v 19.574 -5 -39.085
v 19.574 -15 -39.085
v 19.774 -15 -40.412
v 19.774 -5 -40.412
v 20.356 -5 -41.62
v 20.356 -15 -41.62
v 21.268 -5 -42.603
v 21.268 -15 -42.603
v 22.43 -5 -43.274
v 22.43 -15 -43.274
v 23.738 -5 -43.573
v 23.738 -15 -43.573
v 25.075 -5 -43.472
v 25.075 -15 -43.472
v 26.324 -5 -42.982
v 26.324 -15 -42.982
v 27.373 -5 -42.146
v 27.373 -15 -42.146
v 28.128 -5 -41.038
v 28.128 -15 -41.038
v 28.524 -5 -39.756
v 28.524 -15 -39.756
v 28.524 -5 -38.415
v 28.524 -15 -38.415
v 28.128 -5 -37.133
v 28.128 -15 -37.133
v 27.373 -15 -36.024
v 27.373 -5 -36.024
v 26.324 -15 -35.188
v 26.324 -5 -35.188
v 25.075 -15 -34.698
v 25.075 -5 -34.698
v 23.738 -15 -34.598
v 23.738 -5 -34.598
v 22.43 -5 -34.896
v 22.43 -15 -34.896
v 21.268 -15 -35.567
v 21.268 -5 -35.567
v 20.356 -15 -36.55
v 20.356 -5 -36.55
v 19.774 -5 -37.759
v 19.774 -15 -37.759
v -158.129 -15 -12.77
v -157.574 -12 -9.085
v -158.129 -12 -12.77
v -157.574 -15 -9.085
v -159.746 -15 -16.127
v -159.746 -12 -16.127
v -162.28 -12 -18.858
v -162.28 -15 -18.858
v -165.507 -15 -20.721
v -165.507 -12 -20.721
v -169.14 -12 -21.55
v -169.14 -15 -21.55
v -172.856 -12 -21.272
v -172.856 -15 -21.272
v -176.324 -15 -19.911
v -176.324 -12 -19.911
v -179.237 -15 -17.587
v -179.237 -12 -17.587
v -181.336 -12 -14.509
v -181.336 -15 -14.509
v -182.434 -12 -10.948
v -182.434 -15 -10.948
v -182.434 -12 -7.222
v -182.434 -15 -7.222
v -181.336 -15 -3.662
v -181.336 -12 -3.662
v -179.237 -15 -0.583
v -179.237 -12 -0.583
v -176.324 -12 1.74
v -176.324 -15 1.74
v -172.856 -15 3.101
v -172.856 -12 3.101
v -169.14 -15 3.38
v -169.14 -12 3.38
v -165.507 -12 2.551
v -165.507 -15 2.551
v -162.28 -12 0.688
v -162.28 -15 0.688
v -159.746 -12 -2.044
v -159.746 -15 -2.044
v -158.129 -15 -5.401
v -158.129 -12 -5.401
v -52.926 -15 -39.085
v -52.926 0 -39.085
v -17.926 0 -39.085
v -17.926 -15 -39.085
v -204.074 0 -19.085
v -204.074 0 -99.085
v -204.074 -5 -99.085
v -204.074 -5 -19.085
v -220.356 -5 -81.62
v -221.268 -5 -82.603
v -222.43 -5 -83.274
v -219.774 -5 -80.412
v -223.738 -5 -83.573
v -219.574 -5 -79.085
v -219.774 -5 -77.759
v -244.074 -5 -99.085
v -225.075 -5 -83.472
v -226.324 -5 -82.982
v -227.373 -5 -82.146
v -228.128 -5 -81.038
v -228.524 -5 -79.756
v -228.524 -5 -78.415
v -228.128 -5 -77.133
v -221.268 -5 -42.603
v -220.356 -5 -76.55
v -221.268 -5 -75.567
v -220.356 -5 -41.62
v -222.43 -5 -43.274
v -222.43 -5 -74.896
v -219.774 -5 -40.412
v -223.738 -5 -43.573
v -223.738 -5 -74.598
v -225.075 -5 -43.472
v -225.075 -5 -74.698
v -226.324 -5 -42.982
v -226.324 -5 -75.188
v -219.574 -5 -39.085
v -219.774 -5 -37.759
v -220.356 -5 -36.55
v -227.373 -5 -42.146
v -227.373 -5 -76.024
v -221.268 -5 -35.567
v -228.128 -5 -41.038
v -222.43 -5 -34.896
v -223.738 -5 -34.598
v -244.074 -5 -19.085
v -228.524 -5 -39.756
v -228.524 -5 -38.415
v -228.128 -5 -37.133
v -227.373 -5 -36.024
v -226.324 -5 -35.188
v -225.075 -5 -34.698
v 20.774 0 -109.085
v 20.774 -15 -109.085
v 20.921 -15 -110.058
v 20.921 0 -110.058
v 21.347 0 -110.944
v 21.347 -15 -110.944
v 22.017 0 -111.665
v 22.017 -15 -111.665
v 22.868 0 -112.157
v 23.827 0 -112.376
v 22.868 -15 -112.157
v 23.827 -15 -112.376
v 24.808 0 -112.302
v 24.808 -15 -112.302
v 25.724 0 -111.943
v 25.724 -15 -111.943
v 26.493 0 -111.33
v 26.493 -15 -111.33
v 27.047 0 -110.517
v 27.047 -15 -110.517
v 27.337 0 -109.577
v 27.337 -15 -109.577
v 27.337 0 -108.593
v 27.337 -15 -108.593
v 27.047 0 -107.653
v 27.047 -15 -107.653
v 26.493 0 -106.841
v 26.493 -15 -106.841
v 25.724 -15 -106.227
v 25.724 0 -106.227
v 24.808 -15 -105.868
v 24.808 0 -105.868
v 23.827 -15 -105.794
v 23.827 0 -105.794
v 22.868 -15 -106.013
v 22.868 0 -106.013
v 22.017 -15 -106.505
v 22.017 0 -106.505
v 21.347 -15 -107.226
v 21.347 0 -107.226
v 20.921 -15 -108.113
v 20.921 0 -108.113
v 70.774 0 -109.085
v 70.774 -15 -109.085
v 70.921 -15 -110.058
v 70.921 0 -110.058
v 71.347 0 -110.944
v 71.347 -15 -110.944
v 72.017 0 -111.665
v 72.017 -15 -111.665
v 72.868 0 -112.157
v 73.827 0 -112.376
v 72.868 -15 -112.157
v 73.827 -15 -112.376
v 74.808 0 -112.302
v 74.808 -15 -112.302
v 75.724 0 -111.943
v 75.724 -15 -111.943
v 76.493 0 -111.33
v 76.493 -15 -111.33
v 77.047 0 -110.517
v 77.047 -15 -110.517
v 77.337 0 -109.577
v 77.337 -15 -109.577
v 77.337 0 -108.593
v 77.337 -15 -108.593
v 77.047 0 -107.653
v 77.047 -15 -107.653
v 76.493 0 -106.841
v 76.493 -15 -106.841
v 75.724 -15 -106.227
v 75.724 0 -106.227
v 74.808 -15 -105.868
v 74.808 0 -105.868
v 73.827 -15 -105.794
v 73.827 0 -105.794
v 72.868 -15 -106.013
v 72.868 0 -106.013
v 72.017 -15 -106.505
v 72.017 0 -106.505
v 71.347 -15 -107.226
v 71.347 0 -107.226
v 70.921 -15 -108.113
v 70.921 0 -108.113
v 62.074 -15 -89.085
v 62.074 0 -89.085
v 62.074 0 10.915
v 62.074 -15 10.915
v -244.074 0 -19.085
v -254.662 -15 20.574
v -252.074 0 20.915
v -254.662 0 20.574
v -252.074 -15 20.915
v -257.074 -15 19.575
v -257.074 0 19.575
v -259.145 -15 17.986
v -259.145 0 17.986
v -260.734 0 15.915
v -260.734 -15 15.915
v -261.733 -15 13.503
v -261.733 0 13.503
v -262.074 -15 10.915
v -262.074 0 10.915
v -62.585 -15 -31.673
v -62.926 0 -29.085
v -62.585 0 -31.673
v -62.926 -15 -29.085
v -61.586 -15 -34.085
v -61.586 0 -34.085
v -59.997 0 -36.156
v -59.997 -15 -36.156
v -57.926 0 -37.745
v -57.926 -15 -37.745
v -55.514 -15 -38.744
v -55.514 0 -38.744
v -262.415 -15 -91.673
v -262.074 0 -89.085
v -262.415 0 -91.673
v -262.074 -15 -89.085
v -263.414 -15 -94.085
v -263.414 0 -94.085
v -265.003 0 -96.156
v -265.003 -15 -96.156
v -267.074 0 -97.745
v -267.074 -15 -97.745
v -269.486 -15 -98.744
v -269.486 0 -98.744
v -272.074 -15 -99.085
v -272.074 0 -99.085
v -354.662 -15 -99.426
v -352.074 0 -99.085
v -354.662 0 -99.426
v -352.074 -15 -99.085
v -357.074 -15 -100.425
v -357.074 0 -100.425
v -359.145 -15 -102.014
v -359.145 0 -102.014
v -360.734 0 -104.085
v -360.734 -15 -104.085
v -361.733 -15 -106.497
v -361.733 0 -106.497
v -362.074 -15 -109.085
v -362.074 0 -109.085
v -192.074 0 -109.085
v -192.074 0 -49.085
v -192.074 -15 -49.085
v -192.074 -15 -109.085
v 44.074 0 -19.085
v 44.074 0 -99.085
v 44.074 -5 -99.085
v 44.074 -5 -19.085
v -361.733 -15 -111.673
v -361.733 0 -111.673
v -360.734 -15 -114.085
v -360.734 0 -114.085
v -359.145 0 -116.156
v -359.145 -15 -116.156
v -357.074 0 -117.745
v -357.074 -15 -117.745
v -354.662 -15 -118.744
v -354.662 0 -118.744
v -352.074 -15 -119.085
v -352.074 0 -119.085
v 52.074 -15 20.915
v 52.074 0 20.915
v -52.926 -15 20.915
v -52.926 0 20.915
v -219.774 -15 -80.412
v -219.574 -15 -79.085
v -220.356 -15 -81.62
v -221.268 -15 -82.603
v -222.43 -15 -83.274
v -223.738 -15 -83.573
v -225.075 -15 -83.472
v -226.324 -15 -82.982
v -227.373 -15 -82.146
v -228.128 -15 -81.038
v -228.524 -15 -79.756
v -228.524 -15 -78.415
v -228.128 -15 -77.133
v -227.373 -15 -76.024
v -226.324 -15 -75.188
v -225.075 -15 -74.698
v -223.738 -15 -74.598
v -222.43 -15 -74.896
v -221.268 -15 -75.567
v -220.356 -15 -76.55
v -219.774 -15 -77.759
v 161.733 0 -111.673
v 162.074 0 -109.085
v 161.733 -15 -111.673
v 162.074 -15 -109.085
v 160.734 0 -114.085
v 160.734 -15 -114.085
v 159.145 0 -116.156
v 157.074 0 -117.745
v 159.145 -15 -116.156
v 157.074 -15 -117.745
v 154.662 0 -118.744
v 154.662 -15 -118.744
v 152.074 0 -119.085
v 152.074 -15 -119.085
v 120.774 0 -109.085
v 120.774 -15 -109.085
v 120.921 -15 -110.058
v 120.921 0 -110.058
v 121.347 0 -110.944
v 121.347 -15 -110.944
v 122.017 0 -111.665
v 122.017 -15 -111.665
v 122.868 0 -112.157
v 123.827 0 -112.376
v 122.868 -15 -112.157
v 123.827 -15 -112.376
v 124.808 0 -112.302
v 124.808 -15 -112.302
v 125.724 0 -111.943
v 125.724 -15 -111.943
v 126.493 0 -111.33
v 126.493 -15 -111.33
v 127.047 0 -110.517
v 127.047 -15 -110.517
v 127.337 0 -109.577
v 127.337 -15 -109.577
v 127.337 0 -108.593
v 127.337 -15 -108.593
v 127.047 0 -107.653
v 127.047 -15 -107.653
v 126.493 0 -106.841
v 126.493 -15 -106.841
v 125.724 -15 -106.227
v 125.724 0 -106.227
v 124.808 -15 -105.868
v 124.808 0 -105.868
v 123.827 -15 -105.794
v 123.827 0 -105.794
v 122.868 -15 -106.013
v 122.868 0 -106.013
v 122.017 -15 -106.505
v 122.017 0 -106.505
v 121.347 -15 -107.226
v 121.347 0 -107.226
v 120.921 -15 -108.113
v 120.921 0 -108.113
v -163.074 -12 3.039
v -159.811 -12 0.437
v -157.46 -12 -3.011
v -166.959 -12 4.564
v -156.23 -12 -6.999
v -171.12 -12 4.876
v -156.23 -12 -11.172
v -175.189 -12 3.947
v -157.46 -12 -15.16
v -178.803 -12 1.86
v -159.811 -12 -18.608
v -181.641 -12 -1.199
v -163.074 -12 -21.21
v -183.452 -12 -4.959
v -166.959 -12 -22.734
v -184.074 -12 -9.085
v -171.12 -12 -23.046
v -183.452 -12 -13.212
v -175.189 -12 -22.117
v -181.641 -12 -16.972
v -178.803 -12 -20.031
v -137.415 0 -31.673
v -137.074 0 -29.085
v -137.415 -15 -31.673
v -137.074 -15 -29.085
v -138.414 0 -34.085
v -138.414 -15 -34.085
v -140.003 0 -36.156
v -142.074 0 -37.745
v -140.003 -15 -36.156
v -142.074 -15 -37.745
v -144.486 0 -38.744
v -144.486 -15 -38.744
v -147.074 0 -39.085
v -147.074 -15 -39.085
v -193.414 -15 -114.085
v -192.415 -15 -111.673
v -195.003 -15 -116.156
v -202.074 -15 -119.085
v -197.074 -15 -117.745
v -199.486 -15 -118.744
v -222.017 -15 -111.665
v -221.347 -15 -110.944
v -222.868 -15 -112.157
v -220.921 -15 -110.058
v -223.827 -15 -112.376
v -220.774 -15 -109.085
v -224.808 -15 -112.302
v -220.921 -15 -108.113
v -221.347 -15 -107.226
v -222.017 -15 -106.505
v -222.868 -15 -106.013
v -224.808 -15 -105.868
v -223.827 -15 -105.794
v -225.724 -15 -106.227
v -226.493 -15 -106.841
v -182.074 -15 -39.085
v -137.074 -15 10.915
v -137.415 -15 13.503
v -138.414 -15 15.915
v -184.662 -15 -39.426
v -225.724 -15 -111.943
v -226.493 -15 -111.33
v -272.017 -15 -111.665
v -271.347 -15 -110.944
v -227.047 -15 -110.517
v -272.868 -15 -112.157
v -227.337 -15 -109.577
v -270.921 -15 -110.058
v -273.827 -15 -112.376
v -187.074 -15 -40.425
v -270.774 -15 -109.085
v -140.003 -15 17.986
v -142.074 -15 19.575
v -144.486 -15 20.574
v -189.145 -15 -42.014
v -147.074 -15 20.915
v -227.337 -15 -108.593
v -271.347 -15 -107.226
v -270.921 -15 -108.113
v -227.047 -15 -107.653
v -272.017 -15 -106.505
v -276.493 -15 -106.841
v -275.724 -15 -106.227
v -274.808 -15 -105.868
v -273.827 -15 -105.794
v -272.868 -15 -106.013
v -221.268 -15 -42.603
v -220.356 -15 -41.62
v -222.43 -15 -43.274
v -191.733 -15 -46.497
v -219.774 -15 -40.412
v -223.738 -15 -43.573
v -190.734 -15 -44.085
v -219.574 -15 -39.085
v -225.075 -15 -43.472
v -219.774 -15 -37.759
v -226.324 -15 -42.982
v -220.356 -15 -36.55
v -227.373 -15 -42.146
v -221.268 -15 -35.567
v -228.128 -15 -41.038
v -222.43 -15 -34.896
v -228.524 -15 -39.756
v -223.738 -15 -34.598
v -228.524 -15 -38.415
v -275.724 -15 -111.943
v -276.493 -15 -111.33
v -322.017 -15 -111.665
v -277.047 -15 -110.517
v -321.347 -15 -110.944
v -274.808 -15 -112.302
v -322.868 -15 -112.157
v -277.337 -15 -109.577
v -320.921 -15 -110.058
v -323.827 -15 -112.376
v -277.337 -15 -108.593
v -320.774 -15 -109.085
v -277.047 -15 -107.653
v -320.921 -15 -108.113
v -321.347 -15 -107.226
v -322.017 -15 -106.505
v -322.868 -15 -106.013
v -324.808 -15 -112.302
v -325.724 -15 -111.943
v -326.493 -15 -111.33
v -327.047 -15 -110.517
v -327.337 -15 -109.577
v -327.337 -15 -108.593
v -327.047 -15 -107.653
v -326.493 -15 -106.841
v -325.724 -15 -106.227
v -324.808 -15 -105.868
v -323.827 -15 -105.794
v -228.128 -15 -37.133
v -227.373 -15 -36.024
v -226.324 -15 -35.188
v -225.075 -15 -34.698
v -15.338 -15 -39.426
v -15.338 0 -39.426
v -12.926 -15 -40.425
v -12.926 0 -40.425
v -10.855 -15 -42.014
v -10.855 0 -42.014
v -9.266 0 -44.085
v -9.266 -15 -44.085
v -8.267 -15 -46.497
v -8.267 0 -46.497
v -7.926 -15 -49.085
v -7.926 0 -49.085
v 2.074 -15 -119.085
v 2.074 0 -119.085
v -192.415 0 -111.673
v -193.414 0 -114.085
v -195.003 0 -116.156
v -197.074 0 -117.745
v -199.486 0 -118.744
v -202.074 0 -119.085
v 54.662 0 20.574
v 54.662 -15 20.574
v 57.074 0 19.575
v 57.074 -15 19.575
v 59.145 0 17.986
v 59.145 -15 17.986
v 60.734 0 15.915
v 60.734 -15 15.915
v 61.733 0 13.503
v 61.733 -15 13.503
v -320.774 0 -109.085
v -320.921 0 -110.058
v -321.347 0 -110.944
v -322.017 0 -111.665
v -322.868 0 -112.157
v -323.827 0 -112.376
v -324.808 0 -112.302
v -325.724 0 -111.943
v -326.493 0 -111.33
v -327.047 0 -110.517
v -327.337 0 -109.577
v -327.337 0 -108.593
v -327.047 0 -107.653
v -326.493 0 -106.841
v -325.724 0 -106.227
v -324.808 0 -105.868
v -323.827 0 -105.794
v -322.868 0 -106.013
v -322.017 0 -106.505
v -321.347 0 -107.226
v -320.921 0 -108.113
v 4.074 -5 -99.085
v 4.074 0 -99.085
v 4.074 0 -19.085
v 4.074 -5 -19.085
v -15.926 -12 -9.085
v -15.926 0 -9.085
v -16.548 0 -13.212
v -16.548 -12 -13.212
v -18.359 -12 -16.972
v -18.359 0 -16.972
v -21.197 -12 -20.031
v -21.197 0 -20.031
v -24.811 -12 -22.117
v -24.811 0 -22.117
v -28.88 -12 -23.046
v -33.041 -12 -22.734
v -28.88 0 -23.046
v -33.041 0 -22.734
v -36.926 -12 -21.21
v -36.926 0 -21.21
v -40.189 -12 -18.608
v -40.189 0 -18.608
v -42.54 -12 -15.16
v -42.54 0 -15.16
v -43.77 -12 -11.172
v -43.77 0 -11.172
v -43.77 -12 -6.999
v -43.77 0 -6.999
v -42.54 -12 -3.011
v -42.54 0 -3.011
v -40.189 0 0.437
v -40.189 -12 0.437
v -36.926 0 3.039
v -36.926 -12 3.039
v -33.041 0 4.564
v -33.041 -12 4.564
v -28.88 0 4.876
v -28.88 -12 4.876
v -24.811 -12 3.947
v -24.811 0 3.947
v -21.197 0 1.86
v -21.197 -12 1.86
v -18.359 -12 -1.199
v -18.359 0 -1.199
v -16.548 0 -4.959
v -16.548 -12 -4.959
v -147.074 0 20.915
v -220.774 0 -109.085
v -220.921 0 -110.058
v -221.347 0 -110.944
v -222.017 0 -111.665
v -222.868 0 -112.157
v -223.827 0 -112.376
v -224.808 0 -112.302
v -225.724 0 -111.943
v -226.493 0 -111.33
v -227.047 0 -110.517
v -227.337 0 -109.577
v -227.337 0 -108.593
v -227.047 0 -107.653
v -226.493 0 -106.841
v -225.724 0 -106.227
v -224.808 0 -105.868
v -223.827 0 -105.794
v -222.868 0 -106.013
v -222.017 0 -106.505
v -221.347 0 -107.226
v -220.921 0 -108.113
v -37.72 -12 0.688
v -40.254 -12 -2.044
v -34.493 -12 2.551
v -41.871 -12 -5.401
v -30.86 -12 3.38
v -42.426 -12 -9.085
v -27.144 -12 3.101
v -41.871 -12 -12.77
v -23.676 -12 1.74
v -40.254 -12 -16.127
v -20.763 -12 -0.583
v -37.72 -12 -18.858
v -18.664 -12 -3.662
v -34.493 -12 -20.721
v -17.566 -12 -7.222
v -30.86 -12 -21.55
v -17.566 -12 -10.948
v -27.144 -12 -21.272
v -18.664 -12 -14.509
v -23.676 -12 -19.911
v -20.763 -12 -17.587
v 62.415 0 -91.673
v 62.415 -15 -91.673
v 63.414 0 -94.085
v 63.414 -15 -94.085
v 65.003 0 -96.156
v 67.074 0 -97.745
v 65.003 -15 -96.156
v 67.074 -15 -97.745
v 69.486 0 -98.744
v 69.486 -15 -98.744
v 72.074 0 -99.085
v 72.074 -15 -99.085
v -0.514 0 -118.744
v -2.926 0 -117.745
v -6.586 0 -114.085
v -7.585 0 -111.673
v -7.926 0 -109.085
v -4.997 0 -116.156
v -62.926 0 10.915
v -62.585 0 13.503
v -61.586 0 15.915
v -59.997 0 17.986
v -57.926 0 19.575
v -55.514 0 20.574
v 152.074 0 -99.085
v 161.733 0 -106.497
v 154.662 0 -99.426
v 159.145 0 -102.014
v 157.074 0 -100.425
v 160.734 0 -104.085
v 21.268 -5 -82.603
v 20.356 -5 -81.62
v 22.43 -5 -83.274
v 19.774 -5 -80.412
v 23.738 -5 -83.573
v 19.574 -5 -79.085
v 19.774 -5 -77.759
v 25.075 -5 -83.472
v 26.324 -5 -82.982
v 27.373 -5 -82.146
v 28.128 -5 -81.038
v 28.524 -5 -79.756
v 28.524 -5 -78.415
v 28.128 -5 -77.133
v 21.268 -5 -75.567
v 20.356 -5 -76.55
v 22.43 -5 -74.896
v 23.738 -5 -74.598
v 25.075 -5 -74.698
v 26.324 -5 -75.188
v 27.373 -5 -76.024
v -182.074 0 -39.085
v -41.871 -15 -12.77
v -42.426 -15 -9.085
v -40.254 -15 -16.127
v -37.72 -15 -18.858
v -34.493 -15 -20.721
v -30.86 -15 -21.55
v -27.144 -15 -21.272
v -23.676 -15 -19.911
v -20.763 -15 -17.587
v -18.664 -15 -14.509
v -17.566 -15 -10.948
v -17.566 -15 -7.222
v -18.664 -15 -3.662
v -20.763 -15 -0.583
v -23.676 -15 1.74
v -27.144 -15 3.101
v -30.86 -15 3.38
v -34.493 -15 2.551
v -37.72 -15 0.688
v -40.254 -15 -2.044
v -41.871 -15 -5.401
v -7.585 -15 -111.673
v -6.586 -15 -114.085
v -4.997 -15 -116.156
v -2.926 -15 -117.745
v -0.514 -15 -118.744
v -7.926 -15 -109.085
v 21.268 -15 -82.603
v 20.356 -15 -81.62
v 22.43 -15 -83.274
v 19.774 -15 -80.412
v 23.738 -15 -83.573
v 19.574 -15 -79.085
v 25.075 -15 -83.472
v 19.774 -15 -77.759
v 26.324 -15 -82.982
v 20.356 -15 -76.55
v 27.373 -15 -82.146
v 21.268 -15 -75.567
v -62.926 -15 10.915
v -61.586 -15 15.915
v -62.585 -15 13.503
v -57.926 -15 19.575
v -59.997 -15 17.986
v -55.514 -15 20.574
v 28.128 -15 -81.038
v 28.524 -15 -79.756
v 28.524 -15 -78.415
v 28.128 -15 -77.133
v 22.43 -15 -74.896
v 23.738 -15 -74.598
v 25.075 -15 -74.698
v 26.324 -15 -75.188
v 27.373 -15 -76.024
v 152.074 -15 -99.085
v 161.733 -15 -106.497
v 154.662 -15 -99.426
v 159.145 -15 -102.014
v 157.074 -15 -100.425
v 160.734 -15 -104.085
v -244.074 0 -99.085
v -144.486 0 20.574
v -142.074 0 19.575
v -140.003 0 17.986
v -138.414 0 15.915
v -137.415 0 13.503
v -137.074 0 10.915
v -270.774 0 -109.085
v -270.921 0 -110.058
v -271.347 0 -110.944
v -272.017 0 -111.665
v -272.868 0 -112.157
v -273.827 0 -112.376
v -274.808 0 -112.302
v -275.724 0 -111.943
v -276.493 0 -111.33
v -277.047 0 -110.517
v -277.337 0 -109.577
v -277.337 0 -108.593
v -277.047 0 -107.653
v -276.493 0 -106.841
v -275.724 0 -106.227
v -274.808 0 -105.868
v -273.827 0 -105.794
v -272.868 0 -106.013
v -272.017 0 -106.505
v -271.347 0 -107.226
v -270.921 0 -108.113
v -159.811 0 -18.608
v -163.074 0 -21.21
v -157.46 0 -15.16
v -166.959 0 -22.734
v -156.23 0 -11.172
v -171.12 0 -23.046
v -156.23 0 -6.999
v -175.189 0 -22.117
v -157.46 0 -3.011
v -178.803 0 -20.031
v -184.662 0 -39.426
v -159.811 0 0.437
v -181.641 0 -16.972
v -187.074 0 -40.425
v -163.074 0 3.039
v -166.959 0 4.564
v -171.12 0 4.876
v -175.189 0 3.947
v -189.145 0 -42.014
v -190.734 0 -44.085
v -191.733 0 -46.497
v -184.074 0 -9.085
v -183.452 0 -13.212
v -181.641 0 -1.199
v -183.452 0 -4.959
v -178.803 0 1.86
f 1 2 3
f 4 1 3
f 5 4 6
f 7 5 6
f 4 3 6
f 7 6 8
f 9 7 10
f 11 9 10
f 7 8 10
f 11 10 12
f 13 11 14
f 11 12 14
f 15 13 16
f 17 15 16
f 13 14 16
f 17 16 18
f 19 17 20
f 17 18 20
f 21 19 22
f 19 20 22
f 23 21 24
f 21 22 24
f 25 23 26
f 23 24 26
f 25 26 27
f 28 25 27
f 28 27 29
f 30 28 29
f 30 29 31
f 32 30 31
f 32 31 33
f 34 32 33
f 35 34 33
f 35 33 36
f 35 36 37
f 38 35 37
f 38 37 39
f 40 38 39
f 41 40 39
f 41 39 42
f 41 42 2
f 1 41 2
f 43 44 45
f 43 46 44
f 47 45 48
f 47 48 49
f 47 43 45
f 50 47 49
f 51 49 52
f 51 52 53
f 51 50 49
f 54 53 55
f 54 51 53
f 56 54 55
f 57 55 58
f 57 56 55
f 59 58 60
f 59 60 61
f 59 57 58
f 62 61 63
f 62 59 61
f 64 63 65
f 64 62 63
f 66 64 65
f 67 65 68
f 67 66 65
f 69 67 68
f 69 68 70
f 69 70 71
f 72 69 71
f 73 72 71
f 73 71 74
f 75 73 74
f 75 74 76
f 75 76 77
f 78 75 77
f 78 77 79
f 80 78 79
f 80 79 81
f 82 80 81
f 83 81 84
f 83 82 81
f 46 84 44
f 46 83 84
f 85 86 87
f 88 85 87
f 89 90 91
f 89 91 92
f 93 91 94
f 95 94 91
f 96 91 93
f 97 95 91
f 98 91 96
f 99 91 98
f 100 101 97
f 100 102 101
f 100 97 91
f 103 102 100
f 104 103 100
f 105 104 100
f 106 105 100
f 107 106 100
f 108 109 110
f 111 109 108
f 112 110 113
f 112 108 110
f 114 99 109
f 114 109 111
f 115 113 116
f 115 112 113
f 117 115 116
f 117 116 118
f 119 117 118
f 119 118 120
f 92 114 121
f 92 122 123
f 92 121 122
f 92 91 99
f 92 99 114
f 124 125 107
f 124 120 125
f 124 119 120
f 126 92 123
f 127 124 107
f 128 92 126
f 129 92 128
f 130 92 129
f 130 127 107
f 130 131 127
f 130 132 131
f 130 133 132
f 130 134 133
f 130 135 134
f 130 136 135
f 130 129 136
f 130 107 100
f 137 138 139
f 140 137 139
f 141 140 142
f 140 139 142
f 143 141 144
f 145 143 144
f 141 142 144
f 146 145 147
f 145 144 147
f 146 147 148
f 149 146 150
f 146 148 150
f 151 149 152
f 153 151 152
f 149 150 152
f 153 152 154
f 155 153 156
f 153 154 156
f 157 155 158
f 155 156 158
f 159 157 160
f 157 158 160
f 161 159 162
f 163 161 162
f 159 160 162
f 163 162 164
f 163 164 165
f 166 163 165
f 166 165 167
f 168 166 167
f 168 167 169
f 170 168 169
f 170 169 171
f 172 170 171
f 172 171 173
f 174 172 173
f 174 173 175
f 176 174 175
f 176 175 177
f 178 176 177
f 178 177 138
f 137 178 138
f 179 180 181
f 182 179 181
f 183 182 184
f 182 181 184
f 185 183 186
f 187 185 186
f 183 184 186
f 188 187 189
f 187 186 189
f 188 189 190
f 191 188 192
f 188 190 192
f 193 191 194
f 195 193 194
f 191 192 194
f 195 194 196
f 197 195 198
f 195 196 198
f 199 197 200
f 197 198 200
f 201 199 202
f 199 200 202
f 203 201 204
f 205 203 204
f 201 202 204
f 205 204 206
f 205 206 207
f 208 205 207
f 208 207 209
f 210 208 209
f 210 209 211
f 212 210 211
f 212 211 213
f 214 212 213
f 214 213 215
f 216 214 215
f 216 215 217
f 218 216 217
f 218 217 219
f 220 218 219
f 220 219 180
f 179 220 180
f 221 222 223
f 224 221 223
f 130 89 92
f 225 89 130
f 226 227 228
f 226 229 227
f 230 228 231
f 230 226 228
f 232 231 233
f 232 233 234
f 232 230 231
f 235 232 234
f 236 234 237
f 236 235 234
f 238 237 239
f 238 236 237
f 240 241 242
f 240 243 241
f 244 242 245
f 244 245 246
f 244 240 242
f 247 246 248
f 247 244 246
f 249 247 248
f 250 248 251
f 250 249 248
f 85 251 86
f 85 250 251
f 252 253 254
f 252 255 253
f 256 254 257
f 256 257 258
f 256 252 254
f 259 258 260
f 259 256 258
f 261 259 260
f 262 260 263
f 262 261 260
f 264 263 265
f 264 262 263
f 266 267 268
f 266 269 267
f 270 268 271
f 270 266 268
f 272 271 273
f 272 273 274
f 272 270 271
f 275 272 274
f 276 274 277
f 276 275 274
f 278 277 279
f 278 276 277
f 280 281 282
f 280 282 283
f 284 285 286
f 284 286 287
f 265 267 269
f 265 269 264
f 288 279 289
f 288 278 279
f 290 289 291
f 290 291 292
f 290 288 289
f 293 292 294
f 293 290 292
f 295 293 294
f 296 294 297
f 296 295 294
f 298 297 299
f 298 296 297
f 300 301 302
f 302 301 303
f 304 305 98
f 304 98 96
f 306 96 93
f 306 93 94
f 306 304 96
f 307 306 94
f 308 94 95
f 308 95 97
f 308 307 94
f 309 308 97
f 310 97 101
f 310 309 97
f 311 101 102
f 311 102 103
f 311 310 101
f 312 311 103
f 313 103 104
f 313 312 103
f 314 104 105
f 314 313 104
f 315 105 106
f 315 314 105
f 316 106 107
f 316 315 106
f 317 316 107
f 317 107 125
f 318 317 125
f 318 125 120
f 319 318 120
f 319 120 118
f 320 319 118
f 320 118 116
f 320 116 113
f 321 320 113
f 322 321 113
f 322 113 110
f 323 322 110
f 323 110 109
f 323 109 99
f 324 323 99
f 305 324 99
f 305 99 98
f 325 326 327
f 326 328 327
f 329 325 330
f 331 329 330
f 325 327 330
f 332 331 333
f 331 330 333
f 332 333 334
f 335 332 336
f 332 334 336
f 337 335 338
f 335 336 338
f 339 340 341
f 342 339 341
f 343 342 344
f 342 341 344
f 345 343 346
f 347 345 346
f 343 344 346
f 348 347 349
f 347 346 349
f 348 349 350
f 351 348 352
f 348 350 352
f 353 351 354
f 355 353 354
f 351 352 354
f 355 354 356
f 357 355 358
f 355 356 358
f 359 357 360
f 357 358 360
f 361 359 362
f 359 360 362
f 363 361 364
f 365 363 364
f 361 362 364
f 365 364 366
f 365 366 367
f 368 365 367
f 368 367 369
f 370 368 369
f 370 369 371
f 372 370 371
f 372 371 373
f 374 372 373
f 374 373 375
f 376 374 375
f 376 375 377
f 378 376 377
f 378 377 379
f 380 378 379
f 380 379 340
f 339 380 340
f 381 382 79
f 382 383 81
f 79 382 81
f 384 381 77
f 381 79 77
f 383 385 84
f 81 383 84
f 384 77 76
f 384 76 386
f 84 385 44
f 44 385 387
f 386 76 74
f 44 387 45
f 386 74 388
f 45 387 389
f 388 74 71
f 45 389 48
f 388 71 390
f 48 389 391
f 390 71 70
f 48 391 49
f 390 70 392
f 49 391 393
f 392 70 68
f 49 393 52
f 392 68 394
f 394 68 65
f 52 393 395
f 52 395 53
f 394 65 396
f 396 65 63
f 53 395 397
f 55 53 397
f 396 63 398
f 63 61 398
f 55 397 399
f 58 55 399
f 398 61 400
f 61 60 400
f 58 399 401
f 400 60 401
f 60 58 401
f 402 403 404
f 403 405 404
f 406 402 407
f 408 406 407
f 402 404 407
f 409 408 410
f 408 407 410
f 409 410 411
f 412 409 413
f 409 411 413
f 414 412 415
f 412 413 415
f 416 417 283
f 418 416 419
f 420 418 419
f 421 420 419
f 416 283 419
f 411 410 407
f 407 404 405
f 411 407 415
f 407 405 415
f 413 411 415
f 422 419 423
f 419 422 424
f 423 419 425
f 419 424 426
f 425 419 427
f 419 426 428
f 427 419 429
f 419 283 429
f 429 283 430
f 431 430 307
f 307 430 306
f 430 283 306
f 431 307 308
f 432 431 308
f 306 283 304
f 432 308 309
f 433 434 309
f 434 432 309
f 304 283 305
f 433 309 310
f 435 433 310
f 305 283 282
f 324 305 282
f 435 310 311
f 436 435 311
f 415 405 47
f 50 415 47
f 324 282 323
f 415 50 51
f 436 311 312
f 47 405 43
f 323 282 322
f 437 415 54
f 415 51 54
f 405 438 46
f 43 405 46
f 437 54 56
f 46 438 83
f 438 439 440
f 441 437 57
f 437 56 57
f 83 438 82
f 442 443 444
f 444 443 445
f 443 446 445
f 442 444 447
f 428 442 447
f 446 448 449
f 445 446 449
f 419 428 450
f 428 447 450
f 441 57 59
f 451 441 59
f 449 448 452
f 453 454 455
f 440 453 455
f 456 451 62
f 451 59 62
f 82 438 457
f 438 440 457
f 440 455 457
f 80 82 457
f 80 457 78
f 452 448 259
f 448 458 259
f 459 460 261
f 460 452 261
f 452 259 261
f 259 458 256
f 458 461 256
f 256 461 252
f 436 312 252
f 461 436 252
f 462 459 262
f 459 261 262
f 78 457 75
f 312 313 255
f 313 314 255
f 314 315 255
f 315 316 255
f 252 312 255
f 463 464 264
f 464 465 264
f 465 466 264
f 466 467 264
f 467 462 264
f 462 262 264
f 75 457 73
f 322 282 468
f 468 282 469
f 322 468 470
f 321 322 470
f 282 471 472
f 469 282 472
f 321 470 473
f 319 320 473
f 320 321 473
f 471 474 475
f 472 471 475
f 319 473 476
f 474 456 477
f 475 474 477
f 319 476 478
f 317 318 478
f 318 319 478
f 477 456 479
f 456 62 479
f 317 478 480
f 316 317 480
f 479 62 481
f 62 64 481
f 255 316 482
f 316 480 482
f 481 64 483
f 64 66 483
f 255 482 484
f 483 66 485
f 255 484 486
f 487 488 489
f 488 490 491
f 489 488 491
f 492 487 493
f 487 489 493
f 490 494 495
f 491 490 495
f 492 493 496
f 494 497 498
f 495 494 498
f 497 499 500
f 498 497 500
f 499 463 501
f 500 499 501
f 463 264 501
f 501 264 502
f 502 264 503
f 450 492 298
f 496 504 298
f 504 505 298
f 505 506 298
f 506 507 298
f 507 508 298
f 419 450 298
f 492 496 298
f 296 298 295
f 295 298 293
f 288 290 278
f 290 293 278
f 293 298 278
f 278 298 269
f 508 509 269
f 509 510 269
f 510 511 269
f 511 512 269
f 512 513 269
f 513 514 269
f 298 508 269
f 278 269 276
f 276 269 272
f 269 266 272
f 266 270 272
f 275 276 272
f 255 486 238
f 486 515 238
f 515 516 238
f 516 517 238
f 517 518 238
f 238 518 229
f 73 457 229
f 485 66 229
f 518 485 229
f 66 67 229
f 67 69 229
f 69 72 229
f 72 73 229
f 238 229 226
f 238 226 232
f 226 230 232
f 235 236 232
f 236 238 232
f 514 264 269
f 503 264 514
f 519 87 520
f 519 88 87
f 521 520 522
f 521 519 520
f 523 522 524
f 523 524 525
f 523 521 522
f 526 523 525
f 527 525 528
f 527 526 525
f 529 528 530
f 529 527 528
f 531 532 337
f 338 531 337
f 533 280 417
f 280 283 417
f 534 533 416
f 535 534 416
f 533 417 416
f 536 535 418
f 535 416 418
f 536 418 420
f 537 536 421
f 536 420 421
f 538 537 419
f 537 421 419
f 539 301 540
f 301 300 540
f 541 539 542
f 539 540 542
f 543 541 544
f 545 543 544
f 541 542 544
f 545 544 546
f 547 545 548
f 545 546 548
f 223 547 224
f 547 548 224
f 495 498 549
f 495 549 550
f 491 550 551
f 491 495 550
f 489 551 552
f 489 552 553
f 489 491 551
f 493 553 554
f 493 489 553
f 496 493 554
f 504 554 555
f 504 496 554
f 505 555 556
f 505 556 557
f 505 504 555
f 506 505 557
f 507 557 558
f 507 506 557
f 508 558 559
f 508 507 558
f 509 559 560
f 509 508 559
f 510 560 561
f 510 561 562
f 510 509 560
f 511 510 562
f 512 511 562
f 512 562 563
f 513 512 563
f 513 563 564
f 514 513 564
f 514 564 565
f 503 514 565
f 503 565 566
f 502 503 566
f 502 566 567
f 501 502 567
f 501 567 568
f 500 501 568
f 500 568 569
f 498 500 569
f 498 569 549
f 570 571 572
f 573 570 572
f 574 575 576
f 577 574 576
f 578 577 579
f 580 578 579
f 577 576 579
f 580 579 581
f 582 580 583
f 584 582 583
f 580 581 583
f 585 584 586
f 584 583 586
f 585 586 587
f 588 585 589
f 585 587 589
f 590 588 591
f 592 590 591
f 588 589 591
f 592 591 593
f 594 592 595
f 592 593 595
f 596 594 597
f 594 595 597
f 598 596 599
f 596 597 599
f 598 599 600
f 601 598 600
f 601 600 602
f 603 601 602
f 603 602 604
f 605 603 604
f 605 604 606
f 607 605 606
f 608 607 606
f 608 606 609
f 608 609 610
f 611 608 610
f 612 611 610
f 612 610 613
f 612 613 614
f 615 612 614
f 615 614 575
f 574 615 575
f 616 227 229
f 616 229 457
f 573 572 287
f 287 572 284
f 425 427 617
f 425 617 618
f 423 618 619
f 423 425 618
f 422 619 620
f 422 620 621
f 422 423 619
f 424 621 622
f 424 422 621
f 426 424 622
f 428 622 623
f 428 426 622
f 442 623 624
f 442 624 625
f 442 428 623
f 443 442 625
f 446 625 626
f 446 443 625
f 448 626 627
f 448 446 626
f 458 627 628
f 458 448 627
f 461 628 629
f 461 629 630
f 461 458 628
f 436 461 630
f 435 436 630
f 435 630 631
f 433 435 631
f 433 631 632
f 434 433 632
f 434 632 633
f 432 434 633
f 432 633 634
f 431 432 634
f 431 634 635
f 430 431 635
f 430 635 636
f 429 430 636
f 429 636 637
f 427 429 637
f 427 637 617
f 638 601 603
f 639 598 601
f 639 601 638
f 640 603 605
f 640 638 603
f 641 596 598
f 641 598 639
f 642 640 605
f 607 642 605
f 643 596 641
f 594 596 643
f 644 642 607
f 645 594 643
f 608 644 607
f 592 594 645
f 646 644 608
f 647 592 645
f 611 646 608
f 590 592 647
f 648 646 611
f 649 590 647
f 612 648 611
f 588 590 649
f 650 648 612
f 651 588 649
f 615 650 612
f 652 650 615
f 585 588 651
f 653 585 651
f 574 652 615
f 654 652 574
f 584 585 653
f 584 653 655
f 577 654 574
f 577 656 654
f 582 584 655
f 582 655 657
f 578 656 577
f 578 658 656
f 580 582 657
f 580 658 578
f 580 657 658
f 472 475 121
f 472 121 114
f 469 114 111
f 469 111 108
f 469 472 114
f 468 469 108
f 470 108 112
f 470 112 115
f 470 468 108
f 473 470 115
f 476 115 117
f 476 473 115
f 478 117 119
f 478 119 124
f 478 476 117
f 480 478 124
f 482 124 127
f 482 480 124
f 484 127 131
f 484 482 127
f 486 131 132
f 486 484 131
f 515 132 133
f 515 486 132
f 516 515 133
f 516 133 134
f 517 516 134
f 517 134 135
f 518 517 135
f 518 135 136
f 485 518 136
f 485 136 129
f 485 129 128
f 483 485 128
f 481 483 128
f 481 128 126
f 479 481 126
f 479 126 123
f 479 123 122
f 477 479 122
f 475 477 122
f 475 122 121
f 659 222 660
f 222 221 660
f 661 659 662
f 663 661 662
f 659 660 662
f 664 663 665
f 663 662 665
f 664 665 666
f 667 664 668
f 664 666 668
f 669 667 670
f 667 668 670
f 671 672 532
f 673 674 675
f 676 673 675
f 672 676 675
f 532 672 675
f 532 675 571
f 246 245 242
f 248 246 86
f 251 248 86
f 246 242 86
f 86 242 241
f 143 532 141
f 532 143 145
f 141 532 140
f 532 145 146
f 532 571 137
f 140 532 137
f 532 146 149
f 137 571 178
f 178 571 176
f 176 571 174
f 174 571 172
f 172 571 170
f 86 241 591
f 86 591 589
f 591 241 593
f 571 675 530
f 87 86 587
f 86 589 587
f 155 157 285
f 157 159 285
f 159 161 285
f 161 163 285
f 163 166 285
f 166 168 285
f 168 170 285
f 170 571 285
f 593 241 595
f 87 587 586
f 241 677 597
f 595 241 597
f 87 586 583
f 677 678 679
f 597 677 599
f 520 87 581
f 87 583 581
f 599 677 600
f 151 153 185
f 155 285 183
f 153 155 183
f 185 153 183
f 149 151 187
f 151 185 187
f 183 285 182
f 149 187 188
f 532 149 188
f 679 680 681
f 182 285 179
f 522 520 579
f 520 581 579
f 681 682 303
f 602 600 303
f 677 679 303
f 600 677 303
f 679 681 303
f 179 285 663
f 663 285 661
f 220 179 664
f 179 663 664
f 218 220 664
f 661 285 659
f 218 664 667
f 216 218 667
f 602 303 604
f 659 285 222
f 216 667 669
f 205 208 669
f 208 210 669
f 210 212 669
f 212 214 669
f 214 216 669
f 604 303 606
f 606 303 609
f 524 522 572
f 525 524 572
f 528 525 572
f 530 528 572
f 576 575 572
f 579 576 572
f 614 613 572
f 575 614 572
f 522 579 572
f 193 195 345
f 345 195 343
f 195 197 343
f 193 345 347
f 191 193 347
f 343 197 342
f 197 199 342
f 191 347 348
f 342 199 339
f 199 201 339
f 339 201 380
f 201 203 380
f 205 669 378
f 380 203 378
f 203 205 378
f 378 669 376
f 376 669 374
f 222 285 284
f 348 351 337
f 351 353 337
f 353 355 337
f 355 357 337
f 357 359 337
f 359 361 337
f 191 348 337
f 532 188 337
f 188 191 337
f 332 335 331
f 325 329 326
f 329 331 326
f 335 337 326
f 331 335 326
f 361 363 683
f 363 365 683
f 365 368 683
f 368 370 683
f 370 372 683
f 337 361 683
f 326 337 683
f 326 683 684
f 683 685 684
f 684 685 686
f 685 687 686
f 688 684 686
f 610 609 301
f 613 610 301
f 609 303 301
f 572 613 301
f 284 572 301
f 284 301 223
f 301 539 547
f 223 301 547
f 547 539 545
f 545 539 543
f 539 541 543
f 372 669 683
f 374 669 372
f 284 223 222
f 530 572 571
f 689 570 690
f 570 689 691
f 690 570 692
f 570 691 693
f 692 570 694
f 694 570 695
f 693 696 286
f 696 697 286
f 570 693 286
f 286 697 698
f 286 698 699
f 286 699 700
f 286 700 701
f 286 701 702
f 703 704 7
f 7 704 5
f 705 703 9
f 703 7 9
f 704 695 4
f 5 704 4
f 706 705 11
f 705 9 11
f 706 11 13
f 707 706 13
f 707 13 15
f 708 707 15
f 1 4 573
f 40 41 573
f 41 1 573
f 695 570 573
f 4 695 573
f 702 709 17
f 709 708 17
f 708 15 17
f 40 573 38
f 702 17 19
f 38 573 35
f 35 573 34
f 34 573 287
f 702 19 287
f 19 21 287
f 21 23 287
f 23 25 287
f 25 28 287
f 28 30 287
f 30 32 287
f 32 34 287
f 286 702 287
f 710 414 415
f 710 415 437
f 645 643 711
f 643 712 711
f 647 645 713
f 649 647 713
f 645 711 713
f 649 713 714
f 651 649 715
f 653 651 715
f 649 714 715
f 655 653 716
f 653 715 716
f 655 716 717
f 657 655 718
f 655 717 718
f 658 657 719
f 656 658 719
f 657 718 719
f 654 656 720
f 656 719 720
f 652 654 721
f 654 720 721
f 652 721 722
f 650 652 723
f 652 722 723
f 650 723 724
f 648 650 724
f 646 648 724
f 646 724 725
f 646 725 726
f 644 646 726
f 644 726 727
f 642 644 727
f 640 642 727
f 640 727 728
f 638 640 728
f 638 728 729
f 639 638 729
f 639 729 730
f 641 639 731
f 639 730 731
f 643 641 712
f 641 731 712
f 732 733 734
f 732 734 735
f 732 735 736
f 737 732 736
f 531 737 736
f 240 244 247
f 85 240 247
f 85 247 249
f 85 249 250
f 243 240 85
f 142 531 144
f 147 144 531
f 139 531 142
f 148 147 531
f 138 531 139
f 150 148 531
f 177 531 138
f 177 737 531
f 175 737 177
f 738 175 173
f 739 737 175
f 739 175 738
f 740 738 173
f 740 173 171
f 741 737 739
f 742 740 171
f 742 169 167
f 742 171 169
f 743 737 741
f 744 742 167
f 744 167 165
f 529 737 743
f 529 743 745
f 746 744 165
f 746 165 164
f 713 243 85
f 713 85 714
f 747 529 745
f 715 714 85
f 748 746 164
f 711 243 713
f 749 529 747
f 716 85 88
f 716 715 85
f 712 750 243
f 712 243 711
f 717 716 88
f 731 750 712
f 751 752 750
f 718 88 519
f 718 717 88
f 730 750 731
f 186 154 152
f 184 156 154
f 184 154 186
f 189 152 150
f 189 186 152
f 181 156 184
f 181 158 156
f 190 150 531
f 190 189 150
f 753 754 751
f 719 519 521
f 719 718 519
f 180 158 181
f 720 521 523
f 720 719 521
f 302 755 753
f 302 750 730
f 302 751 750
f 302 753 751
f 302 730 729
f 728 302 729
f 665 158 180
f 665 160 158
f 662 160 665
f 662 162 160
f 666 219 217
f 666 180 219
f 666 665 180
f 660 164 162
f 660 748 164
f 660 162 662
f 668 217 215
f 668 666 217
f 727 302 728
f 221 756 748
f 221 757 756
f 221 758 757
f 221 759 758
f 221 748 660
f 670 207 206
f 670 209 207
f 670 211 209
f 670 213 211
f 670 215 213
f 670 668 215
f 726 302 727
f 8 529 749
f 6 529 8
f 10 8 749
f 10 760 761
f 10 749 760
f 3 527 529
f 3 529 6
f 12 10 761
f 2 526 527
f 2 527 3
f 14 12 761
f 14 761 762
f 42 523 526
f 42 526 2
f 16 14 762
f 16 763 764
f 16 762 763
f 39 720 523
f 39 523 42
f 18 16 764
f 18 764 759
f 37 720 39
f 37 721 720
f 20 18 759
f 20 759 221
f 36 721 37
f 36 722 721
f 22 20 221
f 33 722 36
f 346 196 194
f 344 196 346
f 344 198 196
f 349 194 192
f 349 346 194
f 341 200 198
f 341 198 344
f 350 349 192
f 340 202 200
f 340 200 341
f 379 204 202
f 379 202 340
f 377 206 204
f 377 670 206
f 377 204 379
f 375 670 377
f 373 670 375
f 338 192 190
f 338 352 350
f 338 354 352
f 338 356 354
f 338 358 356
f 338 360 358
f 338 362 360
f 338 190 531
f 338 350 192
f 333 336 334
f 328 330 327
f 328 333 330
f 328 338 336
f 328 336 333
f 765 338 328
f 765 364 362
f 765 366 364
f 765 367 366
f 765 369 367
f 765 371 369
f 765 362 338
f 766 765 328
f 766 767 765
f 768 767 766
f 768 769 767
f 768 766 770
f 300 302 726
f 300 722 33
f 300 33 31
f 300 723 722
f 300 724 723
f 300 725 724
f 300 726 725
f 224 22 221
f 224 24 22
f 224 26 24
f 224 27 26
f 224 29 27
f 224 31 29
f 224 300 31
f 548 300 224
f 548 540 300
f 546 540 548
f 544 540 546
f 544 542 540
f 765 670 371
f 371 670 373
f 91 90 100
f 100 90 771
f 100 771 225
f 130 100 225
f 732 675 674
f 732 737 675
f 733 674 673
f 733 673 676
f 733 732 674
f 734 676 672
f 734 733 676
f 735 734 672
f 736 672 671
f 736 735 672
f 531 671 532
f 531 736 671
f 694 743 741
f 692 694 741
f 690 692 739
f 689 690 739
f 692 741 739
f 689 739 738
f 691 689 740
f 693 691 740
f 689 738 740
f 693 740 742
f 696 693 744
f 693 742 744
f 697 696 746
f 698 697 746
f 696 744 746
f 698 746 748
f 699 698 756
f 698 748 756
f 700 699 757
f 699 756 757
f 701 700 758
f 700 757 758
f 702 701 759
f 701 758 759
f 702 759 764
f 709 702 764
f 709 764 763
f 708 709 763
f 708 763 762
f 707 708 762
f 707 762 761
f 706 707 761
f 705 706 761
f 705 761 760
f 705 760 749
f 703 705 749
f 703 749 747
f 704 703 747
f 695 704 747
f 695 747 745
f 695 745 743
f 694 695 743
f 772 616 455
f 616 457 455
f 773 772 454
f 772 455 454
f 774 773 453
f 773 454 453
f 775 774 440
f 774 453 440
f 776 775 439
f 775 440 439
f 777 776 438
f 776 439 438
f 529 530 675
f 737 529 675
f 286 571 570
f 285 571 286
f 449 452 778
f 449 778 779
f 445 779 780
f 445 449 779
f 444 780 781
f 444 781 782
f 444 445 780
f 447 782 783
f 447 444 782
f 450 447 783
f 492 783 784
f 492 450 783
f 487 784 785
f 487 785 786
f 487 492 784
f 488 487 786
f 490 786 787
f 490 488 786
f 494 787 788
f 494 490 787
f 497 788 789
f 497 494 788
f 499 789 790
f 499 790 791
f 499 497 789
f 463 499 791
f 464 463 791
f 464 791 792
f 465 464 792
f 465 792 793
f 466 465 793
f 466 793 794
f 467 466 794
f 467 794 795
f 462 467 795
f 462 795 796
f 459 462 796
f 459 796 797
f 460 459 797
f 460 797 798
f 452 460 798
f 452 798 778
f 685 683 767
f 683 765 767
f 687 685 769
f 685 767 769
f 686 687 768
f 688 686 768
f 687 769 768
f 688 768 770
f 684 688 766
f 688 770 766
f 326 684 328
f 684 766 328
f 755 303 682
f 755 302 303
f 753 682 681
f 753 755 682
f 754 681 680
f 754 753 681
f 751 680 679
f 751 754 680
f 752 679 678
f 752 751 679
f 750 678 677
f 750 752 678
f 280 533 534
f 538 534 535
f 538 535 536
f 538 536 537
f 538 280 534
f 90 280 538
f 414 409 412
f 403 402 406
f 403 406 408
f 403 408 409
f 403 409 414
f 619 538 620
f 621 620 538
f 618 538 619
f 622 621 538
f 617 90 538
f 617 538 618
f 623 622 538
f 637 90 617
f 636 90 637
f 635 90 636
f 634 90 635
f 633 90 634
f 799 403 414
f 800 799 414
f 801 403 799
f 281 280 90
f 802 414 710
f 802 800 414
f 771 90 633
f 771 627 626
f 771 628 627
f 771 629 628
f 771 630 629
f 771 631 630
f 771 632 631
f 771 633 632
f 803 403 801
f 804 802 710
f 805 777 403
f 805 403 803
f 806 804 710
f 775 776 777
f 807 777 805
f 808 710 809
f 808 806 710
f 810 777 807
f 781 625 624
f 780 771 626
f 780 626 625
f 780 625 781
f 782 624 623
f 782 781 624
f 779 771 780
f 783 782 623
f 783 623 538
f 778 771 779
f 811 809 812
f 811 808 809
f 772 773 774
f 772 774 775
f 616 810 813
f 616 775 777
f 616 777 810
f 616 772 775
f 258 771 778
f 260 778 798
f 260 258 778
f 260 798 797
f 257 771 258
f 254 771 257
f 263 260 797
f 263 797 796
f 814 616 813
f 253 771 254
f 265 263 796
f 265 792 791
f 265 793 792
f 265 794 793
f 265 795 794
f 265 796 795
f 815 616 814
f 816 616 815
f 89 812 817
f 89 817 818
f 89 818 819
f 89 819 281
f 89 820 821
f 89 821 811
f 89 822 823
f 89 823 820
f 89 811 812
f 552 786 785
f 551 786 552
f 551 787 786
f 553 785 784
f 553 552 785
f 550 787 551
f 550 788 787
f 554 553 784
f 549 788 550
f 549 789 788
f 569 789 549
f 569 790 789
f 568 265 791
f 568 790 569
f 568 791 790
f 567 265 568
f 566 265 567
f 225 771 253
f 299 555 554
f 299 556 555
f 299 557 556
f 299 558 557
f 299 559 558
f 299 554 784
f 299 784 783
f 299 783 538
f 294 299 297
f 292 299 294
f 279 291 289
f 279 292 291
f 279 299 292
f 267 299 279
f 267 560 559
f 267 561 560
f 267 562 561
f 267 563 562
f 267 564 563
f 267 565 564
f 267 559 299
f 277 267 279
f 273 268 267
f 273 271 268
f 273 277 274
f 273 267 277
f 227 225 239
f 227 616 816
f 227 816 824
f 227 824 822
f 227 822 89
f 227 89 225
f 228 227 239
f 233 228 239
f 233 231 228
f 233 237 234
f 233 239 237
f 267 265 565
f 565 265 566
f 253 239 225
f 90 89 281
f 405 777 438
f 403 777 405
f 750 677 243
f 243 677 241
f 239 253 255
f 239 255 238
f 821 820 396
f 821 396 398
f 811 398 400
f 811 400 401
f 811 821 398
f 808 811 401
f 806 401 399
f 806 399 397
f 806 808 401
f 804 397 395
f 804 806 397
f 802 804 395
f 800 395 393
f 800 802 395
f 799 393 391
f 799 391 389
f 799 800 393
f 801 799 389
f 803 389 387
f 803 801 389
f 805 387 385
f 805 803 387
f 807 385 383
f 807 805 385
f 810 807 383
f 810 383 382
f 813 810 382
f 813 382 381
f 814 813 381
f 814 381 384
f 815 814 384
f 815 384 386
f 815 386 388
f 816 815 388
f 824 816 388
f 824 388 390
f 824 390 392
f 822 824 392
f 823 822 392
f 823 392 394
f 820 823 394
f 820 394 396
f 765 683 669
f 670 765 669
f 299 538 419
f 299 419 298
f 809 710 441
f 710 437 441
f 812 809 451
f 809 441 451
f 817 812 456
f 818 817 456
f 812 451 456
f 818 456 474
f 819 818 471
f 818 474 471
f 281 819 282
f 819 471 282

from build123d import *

# Parameters (mm, degrees)
F1_DEPTH       = 15
F2_D           = 9
F3_D           = 6.6
F4_R           = 9.99999
F5_D           = 25
F5_CBORE_D     = 28
F5_CBORE_DEPTH = 12
F6_W           = 40
F6_H           = 80
F7_DEPTH       = 5


# Not quite as in the source:
# - a fillet or chamfer is up to 0.001 mm smaller than in the source, because OpenCascade refuses the exact size


with BuildPart() as f1:
    # F0 (on Front) → F1 (new body)
    with BuildSketch(Plane.XZ):
        Polygon((62.0740194619, 20.9148037434), (-57.9259805381, 20.9148037434), (-62.9259805381, 20.9148037434), (-62.9259805381, -39.0851962566), (-57.9259805381, -39.0851962566), (-7.9259805381, -39.0851962566), (-7.9259805381, -119.0851962566), (162.0740194619, -119.0851962566), (162.0740194619, -99.0851962566), (62.0740194619, -99.0851962566), align=None)
    extrude(amount=F1_DEPTH)

    # F2 (through all)
    with Locations(Plane(origin=(0, 0, 0), x_dir=(1, 0, 0), z_dir=(0, 1, 0))):
        with Locations((24.0740194619, 79.0851962566), (24.0740194619, 39.0851962566)):
            Hole(F2_D / 2)

    # F3 (through all)
    with Locations(Plane(origin=(0, 0, 0), x_dir=(1, 0, 0), z_dir=(0, 1, 0))):
        with Locations((24.0740194619, 109.0851962566), (74.0740194619, 109.0851962566), (124.0740194619, 109.0851962566)):
            Hole(F3_D / 2)

    # F4 (radius 10 in the source; OpenCascade refuses exactly that, so slightly less here)
    f4_edges = [f1.edges().sort_by_distance(p)[0] for p in [
        (62.074019, -7.5, 20.914804),
        (62.074019, -7.5, -99.085196),
        (162.074019, -7.5, -119.085196),
        (162.074019, -7.5, -99.085196),
        (-7.925981, -7.5, -119.085196),
        (-7.925981, -7.5, -39.085196),
        (-62.925981, -7.5, 20.914804),
        (-62.925981, -7.5, -39.085196),
    ]]
    fillet(f4_edges, radius=F4_R)

    # F5 (through all)
    with Locations(Plane(origin=(0, 0, 0), x_dir=(1, 0, 0), z_dir=(0, 1, 0))):
        with Locations((-29.9259805381, 9.0851962566)):
            CounterBoreHole(F5_D / 2, F5_CBORE_D / 2, F5_CBORE_DEPTH)

    # F6 (on face) → F7 (cut)
    with BuildSketch(Plane.XZ):
        with Locations((24.0740194619, -59.0851962566)):
            Rectangle(F6_W, F6_H)
    extrude(amount=F7_DEPTH, mode=Mode.SUBTRACT)


with BuildPart() as f9_1:
    # F9: instance of F1
    add(f1.part.mirror(Plane.YZ.offset(-100)))


solid = Compound([f1.part, f9_1.part])
